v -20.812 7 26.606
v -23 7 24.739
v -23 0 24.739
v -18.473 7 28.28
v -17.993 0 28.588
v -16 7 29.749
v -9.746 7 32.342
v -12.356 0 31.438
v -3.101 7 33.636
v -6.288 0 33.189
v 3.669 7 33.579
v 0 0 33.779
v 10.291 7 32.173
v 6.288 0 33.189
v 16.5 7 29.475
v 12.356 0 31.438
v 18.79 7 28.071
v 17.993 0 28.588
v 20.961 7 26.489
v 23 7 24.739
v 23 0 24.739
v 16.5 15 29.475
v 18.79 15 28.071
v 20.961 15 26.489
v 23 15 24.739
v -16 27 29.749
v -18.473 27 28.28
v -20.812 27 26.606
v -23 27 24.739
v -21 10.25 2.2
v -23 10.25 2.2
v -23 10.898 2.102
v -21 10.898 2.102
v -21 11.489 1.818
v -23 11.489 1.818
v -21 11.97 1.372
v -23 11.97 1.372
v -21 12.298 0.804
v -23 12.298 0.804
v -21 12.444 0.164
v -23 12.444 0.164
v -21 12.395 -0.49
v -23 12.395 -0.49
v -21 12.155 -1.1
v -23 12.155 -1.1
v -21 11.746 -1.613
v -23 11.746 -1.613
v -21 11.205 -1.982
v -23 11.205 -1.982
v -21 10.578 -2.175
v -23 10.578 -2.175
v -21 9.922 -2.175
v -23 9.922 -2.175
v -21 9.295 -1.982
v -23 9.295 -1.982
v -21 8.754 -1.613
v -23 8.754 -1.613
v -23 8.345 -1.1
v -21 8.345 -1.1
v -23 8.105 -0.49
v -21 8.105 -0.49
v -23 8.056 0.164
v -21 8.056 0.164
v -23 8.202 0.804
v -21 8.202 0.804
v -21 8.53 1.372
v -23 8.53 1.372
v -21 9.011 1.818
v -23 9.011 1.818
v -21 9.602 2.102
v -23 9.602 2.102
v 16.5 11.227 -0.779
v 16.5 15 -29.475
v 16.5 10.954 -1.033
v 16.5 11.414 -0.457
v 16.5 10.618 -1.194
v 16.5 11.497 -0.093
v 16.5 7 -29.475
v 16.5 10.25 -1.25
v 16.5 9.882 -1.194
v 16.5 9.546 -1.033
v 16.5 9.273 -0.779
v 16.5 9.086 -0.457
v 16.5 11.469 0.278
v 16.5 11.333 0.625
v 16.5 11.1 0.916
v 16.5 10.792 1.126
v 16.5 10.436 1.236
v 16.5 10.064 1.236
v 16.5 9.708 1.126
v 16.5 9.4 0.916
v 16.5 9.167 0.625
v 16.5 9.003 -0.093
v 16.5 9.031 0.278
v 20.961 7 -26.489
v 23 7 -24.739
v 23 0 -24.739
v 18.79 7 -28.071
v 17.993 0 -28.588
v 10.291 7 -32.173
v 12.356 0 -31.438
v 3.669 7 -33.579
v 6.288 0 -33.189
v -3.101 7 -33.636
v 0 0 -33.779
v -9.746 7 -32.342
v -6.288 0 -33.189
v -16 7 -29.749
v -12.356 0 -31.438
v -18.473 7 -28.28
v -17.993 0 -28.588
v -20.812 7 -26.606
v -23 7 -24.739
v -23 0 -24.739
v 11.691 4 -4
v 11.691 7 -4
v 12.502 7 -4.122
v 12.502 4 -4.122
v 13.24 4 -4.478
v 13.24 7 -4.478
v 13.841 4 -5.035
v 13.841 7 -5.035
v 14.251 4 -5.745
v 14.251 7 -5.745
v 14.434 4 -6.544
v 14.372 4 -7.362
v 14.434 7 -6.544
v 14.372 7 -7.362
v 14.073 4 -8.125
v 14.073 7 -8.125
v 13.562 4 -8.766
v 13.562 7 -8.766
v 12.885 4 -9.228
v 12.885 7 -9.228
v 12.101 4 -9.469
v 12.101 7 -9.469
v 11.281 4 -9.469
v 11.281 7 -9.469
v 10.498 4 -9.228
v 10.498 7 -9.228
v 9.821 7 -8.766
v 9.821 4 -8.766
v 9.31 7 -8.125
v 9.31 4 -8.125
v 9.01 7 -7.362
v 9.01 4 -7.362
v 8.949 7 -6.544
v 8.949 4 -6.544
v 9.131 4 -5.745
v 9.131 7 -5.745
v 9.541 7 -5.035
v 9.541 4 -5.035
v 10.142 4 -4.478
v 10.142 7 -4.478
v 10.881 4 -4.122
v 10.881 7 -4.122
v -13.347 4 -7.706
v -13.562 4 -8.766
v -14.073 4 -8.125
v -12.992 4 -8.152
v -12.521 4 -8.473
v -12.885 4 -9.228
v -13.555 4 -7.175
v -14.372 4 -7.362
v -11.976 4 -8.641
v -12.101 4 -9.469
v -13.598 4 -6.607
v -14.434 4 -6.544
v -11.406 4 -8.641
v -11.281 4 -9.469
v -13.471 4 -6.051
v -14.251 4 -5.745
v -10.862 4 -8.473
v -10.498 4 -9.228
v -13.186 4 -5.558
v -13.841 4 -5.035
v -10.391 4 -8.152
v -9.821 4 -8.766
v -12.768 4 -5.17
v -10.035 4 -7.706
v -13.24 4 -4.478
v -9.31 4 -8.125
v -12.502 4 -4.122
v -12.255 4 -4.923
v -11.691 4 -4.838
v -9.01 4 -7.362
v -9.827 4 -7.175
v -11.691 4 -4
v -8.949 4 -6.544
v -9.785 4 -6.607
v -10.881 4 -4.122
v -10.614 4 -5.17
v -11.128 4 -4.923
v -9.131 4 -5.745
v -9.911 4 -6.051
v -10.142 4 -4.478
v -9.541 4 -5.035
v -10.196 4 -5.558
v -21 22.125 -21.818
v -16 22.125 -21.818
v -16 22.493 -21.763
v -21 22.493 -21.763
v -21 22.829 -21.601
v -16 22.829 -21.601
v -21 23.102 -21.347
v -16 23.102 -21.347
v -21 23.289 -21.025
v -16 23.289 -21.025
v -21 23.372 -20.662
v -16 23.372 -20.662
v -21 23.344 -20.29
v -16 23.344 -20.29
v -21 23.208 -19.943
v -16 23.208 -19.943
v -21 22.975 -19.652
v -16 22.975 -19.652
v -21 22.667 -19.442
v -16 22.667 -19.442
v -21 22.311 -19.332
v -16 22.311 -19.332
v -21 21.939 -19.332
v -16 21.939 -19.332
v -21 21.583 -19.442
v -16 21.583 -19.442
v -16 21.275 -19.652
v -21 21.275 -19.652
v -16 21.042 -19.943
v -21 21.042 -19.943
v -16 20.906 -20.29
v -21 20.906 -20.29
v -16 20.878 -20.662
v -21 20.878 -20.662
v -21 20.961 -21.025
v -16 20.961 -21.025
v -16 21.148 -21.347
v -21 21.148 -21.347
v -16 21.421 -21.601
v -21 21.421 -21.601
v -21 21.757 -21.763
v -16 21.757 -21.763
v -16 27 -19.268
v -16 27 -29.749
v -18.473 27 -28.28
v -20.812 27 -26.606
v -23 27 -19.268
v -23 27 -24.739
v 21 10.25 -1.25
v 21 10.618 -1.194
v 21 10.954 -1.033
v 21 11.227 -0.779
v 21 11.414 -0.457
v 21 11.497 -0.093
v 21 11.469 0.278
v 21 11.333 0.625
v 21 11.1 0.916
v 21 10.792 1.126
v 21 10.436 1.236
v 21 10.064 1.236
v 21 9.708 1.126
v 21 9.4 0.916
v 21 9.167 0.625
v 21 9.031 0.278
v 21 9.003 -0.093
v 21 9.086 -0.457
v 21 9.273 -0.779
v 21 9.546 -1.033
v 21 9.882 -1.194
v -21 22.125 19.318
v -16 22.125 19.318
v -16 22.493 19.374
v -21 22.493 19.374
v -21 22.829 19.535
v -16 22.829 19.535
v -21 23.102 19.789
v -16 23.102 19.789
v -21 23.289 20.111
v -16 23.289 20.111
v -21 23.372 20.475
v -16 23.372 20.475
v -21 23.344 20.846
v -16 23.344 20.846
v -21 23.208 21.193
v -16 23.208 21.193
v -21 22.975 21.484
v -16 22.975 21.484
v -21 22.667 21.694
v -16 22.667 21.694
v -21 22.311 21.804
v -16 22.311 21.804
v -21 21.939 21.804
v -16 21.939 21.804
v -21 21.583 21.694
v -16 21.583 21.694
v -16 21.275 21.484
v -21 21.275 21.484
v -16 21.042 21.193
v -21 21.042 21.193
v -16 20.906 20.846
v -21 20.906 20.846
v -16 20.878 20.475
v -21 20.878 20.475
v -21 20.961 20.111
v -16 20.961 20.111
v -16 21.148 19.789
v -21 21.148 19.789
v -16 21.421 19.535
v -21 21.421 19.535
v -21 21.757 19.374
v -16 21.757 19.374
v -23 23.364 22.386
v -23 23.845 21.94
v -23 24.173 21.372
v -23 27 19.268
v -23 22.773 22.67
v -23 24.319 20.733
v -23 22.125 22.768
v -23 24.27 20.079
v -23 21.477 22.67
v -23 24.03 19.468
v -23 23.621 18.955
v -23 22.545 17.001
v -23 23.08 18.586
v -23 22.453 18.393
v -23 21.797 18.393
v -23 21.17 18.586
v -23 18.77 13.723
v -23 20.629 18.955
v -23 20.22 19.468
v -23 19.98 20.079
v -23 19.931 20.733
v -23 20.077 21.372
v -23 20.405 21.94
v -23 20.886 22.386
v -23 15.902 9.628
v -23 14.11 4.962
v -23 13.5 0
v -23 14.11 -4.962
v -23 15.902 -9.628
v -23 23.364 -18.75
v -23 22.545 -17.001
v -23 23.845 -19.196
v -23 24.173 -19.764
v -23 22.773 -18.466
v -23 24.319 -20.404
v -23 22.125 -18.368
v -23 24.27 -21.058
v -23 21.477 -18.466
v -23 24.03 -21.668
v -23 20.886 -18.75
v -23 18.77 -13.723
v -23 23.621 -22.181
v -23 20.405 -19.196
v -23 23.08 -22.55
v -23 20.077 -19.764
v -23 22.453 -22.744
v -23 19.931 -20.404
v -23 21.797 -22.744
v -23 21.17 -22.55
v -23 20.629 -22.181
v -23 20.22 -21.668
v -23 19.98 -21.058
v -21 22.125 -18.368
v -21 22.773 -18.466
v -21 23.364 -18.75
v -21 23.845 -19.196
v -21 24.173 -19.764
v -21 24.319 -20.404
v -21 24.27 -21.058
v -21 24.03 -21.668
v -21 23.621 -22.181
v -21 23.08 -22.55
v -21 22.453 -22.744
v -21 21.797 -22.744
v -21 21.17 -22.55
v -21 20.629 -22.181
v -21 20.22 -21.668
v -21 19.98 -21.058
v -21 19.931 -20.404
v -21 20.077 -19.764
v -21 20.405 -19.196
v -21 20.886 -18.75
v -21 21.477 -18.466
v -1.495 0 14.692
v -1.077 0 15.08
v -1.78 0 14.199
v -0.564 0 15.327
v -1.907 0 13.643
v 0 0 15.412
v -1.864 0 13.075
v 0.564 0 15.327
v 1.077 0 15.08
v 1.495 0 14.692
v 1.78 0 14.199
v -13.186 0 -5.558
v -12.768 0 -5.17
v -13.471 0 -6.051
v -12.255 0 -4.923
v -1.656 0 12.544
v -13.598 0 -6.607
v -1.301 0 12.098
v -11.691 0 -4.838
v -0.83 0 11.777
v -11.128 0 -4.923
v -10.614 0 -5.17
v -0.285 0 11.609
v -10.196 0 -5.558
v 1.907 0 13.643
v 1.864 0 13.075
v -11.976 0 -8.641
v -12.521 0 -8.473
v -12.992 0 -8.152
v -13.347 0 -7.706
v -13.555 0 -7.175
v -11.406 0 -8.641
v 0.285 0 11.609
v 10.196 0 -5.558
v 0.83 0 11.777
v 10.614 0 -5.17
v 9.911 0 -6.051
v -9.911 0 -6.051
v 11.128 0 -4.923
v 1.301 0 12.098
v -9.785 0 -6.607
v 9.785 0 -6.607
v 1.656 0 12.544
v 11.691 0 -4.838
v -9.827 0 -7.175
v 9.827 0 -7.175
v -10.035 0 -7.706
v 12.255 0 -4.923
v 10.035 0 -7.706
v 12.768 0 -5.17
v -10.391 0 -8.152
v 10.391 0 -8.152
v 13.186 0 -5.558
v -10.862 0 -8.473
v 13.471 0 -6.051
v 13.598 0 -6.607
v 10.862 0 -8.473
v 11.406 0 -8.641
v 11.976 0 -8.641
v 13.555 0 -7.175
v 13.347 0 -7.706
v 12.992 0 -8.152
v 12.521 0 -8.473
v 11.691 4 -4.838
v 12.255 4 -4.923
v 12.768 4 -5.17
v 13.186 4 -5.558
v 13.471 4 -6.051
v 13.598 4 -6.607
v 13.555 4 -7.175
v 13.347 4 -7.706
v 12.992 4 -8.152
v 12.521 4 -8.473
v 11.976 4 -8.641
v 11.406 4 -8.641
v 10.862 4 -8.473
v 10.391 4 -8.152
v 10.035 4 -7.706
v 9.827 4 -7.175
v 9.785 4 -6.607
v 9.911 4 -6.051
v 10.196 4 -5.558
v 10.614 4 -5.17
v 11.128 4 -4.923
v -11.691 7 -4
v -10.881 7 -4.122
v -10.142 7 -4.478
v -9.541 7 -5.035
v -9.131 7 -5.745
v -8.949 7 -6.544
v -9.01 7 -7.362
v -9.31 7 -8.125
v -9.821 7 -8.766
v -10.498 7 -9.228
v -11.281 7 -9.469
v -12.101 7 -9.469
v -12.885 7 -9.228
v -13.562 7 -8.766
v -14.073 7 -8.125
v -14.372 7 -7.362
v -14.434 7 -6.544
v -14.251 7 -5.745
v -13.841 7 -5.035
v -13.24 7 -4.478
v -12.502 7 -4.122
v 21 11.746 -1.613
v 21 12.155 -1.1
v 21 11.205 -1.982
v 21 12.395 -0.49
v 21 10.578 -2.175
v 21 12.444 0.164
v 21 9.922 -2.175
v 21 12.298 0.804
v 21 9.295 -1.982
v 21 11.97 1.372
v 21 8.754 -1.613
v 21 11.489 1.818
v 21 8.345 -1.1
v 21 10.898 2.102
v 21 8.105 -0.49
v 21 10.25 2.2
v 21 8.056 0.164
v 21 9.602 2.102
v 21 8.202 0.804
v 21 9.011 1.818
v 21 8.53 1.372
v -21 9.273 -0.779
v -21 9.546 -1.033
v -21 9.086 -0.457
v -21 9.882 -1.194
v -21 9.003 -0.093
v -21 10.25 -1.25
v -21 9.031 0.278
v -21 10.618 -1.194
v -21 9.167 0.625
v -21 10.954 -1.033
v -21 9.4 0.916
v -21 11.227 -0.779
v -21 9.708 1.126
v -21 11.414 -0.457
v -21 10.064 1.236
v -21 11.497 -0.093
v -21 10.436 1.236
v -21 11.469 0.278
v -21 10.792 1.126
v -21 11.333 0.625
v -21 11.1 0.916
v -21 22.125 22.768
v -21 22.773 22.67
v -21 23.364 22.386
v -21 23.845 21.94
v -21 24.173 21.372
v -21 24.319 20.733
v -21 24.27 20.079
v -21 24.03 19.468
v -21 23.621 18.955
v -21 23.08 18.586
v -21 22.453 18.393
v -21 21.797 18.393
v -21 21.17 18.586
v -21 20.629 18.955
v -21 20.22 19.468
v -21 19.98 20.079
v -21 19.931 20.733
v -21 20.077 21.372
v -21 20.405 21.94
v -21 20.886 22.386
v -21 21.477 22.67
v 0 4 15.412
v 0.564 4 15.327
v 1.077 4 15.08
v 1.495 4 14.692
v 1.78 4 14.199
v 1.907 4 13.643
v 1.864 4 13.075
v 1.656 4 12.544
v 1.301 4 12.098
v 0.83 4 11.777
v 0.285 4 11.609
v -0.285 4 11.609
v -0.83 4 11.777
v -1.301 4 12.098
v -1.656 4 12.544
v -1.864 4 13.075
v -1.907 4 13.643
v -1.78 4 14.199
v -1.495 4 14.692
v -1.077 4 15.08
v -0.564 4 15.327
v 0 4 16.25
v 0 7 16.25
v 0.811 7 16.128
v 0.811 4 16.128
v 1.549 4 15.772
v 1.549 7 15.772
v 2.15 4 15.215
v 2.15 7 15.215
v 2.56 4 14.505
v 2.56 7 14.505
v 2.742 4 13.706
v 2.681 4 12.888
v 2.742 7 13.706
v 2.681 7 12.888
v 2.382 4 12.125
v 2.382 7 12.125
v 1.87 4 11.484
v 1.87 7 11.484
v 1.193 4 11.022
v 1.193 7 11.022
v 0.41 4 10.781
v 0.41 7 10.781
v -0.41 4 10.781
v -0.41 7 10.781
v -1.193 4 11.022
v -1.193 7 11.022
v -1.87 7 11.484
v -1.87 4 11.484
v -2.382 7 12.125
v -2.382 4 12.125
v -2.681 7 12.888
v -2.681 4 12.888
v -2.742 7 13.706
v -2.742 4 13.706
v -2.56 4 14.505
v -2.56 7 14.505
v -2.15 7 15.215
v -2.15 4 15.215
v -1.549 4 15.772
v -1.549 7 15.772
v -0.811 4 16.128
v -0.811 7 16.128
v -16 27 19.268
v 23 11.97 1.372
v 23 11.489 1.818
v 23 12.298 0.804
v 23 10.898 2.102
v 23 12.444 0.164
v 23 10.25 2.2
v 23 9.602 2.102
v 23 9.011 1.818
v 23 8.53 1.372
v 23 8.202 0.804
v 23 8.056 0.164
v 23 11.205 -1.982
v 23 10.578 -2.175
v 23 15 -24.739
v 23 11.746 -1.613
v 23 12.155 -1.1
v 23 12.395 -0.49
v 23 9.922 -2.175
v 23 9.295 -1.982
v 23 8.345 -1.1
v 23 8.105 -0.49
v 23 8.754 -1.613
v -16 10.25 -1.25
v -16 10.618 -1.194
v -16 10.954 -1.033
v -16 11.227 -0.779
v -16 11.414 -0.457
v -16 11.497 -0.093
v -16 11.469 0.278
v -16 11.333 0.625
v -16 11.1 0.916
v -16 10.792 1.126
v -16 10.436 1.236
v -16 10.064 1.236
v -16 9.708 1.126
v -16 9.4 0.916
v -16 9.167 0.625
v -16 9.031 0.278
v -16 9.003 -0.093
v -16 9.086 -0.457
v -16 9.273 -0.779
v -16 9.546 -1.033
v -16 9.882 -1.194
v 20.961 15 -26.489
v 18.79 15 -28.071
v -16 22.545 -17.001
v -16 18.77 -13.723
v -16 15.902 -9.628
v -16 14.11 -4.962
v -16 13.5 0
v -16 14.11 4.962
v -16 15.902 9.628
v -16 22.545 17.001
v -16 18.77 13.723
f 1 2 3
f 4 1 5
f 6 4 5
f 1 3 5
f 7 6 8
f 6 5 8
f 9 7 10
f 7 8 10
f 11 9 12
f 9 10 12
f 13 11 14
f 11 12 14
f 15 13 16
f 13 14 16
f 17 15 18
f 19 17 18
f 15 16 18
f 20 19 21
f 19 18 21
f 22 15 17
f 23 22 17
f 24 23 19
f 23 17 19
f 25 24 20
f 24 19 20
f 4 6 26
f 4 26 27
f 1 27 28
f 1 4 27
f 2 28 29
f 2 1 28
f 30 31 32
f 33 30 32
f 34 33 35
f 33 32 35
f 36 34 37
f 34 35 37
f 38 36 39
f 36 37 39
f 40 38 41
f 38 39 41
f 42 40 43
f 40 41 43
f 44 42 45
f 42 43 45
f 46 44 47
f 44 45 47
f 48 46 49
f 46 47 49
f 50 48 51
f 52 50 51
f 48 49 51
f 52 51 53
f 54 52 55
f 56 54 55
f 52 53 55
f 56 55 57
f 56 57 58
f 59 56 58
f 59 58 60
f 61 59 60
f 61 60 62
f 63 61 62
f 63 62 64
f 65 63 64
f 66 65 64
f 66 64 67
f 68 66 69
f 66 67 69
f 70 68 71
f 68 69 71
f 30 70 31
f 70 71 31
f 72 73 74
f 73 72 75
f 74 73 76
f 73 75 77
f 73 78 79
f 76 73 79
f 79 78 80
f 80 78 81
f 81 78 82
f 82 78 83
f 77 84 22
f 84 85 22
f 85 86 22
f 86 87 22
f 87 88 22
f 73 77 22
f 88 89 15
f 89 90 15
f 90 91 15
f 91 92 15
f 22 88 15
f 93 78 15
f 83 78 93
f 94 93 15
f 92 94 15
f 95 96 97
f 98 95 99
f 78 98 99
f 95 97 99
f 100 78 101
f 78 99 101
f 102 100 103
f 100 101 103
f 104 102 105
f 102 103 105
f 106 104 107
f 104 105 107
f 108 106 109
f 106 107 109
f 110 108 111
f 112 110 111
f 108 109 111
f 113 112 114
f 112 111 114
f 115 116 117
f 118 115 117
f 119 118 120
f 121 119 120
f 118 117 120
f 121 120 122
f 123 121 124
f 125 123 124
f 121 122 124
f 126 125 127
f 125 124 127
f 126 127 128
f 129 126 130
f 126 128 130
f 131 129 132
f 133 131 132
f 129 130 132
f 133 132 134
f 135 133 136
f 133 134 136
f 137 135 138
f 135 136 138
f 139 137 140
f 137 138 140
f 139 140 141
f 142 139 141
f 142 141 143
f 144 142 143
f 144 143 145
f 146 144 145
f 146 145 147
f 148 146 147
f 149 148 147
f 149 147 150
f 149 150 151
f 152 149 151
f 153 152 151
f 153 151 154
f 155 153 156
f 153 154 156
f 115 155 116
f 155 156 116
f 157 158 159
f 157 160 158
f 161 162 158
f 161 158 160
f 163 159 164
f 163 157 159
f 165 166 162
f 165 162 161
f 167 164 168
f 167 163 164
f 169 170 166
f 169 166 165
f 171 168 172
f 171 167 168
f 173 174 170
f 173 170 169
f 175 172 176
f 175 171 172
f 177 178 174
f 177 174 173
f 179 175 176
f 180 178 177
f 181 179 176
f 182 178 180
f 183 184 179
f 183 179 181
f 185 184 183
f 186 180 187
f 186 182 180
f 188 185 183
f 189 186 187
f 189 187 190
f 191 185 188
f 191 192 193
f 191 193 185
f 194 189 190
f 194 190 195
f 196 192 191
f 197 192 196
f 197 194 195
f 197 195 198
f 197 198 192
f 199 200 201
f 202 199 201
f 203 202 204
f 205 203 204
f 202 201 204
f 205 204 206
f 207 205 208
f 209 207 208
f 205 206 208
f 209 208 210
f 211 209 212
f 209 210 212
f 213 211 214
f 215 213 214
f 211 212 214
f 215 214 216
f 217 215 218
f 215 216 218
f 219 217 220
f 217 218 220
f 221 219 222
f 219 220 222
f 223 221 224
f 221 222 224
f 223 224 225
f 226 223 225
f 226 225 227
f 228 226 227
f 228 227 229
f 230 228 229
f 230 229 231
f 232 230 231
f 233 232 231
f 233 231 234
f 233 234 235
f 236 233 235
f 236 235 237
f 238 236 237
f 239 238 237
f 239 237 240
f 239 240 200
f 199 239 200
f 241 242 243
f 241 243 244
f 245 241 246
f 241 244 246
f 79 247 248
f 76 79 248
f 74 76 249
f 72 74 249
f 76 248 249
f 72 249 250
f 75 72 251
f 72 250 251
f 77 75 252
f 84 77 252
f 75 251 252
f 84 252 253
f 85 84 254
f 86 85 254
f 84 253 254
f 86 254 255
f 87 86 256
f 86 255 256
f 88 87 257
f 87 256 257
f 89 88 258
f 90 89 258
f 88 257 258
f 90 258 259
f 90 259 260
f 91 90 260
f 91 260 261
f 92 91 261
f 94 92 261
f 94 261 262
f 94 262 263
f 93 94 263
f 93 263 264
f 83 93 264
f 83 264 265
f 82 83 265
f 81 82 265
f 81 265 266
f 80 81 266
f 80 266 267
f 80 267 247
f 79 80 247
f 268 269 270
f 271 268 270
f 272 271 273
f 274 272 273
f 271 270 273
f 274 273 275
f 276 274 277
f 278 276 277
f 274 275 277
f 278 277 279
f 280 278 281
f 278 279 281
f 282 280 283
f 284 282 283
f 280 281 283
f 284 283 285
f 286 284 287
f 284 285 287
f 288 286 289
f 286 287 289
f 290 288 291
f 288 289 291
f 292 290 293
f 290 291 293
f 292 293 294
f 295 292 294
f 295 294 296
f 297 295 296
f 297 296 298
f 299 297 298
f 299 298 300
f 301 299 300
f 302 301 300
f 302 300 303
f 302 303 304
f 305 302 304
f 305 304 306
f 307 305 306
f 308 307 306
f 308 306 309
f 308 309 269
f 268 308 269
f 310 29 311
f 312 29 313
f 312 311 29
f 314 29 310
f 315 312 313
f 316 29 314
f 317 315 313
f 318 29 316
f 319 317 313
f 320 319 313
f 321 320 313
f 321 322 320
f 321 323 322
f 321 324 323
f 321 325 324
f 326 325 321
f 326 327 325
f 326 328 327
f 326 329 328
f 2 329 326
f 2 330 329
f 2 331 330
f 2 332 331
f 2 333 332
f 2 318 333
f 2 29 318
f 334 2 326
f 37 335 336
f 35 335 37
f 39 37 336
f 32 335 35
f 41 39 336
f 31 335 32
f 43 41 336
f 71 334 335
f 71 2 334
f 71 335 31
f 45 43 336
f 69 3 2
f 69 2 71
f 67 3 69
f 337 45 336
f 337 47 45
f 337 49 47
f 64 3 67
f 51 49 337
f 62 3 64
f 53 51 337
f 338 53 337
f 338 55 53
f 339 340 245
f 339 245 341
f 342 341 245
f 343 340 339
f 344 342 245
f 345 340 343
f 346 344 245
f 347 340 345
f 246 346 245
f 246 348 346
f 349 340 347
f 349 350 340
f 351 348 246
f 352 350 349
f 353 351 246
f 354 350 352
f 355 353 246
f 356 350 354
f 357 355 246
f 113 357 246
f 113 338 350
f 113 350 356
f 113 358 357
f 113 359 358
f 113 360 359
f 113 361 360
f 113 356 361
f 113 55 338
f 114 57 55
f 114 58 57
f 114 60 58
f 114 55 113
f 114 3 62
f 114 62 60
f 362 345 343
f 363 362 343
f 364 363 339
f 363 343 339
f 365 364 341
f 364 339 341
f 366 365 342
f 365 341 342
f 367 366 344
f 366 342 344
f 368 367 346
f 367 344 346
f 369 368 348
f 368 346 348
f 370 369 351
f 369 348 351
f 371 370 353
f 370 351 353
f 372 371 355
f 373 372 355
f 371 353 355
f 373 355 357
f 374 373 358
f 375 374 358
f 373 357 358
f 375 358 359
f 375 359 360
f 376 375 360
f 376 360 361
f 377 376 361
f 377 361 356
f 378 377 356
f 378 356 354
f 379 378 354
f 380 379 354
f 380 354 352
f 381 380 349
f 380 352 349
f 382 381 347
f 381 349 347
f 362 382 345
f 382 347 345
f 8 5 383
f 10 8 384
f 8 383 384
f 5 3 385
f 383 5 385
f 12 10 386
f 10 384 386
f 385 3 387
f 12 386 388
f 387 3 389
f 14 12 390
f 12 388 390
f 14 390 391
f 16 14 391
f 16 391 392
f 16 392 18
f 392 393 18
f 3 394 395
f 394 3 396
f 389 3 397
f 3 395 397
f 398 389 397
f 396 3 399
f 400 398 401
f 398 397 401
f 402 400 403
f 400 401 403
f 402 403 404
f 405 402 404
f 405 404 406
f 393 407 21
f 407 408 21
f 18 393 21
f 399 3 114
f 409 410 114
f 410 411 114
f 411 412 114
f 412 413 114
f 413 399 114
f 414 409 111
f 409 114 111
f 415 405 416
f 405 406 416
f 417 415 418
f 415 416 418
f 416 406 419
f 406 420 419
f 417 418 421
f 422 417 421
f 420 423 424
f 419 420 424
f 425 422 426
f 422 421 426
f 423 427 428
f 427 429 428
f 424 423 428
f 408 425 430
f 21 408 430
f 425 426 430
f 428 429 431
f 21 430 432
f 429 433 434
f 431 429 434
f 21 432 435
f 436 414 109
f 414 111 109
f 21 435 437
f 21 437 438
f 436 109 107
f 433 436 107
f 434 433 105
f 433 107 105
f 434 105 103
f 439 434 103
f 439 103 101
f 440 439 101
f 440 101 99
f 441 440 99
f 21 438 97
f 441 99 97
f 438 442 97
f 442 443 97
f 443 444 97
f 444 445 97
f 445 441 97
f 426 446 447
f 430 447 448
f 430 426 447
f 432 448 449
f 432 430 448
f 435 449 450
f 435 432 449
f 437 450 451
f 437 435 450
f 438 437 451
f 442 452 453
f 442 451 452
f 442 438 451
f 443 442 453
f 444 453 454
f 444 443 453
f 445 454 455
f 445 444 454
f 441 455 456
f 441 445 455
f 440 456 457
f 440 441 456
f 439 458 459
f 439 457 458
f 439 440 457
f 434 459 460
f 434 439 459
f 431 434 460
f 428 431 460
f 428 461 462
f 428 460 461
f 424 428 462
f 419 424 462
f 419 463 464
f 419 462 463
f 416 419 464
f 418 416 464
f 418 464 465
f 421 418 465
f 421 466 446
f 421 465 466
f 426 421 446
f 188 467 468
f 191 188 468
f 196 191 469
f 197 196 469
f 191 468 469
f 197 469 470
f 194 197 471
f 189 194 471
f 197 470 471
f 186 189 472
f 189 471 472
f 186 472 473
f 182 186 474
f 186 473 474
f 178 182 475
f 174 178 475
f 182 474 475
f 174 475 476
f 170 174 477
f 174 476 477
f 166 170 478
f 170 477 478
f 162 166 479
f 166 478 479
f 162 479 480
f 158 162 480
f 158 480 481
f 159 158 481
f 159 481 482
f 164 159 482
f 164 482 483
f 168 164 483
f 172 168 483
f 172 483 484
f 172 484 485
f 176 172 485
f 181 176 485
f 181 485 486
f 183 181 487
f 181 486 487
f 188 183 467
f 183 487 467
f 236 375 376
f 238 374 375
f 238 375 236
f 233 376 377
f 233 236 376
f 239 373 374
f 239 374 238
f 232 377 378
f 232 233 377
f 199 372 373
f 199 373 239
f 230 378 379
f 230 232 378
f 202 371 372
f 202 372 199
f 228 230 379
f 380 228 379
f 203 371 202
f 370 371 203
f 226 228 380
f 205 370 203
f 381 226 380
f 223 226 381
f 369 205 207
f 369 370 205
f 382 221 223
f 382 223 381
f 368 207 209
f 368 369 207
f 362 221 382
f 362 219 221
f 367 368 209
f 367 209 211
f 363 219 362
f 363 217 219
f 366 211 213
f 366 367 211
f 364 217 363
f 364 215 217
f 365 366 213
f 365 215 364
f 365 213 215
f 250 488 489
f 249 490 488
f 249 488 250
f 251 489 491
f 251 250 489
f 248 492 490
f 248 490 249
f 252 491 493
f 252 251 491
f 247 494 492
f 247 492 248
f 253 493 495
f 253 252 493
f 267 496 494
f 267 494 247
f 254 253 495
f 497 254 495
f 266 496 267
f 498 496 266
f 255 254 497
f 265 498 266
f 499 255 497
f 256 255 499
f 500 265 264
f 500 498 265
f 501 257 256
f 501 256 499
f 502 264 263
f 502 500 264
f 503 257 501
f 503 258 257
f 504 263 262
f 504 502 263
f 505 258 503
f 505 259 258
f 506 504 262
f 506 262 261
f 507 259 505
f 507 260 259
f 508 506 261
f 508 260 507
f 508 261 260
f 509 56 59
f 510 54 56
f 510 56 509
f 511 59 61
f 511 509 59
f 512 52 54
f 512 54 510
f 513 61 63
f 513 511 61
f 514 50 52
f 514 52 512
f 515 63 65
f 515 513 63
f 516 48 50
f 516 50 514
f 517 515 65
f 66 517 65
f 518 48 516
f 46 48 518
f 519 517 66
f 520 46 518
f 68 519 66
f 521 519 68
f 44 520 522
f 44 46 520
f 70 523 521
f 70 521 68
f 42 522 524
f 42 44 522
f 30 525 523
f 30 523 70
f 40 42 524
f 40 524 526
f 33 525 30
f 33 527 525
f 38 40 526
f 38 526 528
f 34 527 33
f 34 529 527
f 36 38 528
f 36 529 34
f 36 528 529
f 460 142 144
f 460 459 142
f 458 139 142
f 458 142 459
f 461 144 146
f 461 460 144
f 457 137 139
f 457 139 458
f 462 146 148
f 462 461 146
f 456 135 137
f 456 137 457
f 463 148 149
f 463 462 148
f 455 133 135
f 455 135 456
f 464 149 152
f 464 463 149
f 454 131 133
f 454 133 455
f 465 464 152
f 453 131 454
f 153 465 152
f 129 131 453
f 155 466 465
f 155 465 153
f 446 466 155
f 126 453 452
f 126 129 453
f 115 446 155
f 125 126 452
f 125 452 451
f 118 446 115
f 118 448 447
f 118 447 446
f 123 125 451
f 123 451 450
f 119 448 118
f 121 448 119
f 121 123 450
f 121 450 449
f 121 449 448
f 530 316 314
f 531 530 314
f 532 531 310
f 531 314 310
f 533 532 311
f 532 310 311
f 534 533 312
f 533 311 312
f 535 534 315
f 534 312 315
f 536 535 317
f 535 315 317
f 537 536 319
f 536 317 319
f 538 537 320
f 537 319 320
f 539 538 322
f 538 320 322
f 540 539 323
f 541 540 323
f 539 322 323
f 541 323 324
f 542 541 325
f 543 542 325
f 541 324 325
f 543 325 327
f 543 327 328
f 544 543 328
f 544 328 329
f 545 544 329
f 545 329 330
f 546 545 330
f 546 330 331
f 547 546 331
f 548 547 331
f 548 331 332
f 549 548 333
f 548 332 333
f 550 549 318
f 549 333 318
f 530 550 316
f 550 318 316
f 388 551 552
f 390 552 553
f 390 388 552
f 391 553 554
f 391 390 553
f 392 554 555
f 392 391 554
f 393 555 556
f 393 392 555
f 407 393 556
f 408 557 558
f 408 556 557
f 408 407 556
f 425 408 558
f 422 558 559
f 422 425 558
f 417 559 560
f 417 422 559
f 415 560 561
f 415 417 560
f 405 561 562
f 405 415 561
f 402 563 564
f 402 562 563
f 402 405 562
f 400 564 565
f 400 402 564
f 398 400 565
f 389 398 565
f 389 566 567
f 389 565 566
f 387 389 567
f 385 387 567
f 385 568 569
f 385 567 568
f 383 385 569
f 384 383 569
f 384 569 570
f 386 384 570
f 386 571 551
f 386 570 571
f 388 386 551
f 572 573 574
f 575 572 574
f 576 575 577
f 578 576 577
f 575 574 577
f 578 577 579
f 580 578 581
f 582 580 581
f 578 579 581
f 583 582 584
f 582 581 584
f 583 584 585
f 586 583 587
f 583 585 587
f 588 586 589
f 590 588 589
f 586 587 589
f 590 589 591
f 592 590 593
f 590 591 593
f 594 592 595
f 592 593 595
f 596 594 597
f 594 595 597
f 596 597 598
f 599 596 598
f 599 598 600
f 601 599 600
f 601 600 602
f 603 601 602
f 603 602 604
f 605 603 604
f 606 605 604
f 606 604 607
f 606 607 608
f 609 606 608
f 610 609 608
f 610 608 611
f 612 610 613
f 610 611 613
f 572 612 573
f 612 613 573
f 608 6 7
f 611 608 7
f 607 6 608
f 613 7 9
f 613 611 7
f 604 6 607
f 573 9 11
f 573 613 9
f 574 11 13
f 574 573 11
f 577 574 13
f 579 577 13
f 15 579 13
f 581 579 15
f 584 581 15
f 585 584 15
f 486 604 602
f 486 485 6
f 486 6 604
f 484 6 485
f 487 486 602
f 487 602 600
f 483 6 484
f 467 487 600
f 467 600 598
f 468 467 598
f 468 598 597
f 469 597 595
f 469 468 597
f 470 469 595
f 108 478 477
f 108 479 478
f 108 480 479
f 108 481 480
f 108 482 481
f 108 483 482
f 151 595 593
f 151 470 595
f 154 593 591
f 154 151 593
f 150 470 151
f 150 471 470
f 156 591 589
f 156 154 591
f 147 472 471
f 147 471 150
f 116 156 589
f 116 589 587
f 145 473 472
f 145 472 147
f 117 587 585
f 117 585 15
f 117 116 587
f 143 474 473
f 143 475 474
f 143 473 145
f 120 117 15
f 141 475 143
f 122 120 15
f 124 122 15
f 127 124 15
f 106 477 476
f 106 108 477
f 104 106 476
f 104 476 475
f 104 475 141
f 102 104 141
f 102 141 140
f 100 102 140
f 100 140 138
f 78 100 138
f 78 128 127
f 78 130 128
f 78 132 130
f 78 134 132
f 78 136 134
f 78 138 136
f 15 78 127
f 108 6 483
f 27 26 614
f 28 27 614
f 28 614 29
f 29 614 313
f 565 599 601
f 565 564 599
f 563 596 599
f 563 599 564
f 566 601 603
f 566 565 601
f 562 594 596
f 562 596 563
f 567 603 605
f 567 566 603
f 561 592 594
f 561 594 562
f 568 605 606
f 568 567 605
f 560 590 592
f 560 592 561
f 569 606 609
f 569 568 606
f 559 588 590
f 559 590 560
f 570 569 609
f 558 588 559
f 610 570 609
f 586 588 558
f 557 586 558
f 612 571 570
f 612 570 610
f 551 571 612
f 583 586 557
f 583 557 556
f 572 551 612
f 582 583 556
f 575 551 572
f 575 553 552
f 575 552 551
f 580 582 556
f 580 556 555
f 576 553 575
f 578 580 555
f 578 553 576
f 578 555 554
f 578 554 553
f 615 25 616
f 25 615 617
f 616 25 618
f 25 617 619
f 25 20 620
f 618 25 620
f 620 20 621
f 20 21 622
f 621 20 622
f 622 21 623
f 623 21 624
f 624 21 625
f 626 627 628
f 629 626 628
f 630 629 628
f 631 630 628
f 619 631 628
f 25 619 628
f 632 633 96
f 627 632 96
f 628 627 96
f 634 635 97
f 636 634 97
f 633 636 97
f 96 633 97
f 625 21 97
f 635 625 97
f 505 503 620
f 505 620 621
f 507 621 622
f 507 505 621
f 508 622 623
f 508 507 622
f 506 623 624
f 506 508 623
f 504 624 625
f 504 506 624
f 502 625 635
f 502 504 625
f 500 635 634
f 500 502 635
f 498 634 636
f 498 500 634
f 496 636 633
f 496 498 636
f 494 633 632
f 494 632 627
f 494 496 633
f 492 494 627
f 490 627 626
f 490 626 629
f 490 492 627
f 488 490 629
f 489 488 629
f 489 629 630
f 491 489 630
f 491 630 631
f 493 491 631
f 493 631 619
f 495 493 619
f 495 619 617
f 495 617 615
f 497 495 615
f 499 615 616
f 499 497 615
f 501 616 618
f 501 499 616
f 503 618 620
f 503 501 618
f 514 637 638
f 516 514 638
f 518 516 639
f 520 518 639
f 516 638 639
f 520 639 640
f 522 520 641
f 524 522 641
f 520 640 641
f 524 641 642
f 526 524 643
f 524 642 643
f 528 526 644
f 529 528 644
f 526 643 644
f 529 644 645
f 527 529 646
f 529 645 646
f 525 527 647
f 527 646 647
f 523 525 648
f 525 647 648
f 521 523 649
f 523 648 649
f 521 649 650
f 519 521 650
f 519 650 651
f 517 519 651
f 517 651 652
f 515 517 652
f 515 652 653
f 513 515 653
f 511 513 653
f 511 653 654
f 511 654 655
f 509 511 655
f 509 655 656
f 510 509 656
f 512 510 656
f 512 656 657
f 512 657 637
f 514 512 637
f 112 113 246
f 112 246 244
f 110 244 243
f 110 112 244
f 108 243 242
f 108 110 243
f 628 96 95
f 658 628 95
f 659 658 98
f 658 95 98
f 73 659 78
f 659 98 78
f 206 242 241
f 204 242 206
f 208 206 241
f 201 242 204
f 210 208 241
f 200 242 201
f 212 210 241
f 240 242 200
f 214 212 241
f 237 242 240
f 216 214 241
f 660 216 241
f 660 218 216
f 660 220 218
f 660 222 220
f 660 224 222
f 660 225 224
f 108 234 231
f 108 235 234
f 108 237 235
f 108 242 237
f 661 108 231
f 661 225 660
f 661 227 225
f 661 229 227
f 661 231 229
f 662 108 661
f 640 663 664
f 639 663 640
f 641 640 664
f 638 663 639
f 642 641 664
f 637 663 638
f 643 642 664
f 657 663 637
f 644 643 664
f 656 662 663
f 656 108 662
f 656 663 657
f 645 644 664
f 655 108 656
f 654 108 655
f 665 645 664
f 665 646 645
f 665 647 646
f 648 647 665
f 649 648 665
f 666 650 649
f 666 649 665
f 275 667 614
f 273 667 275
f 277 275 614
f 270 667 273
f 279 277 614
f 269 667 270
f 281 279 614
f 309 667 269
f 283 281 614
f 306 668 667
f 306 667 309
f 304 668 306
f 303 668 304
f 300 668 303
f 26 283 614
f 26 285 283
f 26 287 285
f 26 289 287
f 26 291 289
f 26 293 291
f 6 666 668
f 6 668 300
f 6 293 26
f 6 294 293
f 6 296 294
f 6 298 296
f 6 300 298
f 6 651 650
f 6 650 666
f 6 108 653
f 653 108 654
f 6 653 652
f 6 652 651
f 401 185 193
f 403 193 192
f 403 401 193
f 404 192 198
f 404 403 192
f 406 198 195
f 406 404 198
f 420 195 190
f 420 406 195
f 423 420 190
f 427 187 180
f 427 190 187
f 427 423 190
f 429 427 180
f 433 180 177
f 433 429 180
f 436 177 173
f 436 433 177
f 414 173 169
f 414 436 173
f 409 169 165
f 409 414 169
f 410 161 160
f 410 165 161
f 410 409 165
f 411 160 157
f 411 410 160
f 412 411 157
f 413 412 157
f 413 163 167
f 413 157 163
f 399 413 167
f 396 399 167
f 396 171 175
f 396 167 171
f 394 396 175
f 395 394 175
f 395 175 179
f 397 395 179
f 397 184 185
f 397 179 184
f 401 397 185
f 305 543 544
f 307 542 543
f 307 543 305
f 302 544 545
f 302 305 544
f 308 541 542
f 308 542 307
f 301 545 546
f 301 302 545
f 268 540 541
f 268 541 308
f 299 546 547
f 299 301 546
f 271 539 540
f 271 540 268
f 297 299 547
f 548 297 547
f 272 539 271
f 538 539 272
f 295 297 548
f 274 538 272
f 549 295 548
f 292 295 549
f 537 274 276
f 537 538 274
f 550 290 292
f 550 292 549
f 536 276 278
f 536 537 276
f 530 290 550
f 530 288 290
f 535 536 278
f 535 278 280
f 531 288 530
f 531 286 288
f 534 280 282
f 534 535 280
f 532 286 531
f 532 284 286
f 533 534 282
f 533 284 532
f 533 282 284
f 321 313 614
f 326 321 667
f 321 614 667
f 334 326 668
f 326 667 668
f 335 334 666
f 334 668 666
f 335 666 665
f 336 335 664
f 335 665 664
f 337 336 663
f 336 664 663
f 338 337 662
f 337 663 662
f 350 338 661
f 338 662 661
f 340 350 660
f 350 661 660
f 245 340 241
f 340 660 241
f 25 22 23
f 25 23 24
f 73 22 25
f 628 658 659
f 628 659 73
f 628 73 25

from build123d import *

# Parameters (mm, degrees)
SKETCH8_R            = 1.912019499
BOSS_EXTRUDE7_DEPTH  = 7
SKETCH9_R            = 2.75
CUT_EXTRUDE4_DEPTH   = 3
BOSS_EXTRUDE9_DEPTH  = 20
SKETCH13_R           = 20.5
CUT_EXTRUDE7_DEPTH   = 19.5
SKETCH14_R           = 1.25
CUT_EXTRUDE8_DEPTH   = 19.5
SKETCH15_R           = 2.2
CUT_EXTRUDE9_DEPTH   = 2
BOSS_EXTRUDE10_DEPTH = 8
SKETCH17_R           = 1.25
CUT_EXTRUDE10_DEPTH  = 7.5
CUT_EXTRUDE11_START  = -2
SKETCH18_R           = 2.2
CUT_EXTRUDE11_DEPTH  = 2


with BuildPart() as part:
    # Sketch8 → Boss-Extrude7 (new body)
    with BuildSketch(Plane(origin=(0, 0, 0), x_dir=(1, 0, 0), z_dir=(0, 1, 0))):
        with BuildLine():
            Line((-23, 24.739070187), (-23, -24.739070187))
            ThreePointArc((-23, -24.739070187), (0, -33.779011142), (23, -24.739070187))
            Line((23, -24.739070187), (23, 24.739070187))
            ThreePointArc((23, 24.739070187), (0, 33.779011142), (-23, 24.739070187))
        make_face()
        with Locations(Location((11.691342951, 6.75, 0), (0, 0, 270))):
            Circle(SKETCH8_R, mode=Mode.SUBTRACT)
        with Locations(Location((0, -13.5, 0), (0, 0, 270))):
            Circle(SKETCH8_R, mode=Mode.SUBTRACT)
        with Locations(Location((-11.691342951, 6.75, 0), (0, 0, 270))):
            Circle(SKETCH8_R, mode=Mode.SUBTRACT)
    extrude(amount=BOSS_EXTRUDE7_DEPTH)

    # Sketch9 → Cut-Extrude4 (cut)
    with BuildSketch(Plane(origin=(0, 7, 0), x_dir=(1, 0, 0), z_dir=(0, 1, 0))):
        with Locations(Location((-11.691342951, 6.75, 0), (0, 0, 270))):
            Circle(SKETCH9_R)
        with Locations(Location((11.691342951, 6.75, 0), (0, 0, 270))):
            Circle(SKETCH9_R)
        with Locations(Location((0, -13.5, 0), (0, 0, 270))):
            Circle(SKETCH9_R)
    extrude(amount=-CUT_EXTRUDE4_DEPTH, mode=Mode.SUBTRACT)

    # Sketch12 → Boss-Extrude9 (add)
    with BuildSketch(Plane(origin=(0, 7, 0), x_dir=(1, 0, 0), z_dir=(0, 1, 0))):
        with BuildLine():
            Line((-16, 29.749312491), (-16, -29.749312491))
            ThreePointArc((-16, -29.749312491), (-19.660255135, -27.468089881), (-23, -24.739070187))
            Line((-23, -24.739070187), (-23, 24.739070187))
            ThreePointArc((-23, 24.739070187), (-19.660255135, 27.468089881), (-16, 29.749312491))
        make_face()
    extrude(amount=BOSS_EXTRUDE9_DEPTH)

    # Sketch13 → Cut-Extrude7 (cut)
    with BuildSketch(Plane(origin=(-16, 0, 0), x_dir=(0, 0, -1), z_dir=(1, 0, 0))):
        with Locations((0, 34)):
            Circle(SKETCH13_R)
    extrude(amount=-CUT_EXTRUDE7_DEPTH, mode=Mode.SUBTRACT)

    # Sketch14 → Cut-Extrude8 (cut)
    with BuildSketch(Plane(origin=(-16, 0, 0), x_dir=(0, 0, -1), z_dir=(1, 0, 0))):
        with Locations((0, 10.25)):
            Circle(SKETCH14_R)
        with Locations((-20.56810334, 22.125)):
            Circle(SKETCH14_R)
        with Locations((20.56810334, 22.125)):
            Circle(SKETCH14_R)
    extrude(amount=-CUT_EXTRUDE8_DEPTH, mode=Mode.SUBTRACT)

    # Sketch15 → Cut-Extrude9 (cut)
    with BuildSketch(Plane.ZY.offset(23)):
        with Locations((0, 10.25)):
            Circle(SKETCH15_R)
        with Locations((-20.56810334, 22.125)):
            Circle(SKETCH15_R)
        with Locations((20.56810334, 22.125)):
            Circle(SKETCH15_R)
    extrude(amount=-CUT_EXTRUDE9_DEPTH, mode=Mode.SUBTRACT)

    # Sketch16 → Boss-Extrude10 (add)
    with BuildSketch(Plane(origin=(0, 7, 0), x_dir=(1, 0, 0), z_dir=(0, 1, 0))):
        with BuildLine():
            Line((16.5, 29.474931615), (16.5, -29.474931615))
            ThreePointArc((16.5, -29.474931615), (19.891445294, -27.301135468), (23, -24.739070187))
            Line((23, -24.739070187), (23, 24.739070187))
            ThreePointArc((23, 24.739070187), (19.891445294, 27.301135468), (16.5, 29.474931615))
        make_face()
    extrude(amount=BOSS_EXTRUDE10_DEPTH)

    # Sketch17 → Cut-Extrude10 (cut)
    with BuildSketch(Plane(origin=(23, 0, 0), x_dir=(0, 0, -1), z_dir=(1, 0, 0))):
        with Locations((0, 10.25)):
            Circle(SKETCH17_R)
    extrude(amount=-CUT_EXTRUDE10_DEPTH, mode=Mode.SUBTRACT)

    # Sketch18 → Cut-Extrude11 (cut)
    with BuildSketch(Plane(origin=(23, 0, 0), x_dir=(0, 0, -1), z_dir=(1, 0, 0)).offset(CUT_EXTRUDE11_START)):
        with Locations(Location((0, 10.25, 0), (0, 0, 180))):
            Circle(SKETCH18_R)
    extrude(amount=CUT_EXTRUDE11_DEPTH, mode=Mode.SUBTRACT)


solid = part.part
